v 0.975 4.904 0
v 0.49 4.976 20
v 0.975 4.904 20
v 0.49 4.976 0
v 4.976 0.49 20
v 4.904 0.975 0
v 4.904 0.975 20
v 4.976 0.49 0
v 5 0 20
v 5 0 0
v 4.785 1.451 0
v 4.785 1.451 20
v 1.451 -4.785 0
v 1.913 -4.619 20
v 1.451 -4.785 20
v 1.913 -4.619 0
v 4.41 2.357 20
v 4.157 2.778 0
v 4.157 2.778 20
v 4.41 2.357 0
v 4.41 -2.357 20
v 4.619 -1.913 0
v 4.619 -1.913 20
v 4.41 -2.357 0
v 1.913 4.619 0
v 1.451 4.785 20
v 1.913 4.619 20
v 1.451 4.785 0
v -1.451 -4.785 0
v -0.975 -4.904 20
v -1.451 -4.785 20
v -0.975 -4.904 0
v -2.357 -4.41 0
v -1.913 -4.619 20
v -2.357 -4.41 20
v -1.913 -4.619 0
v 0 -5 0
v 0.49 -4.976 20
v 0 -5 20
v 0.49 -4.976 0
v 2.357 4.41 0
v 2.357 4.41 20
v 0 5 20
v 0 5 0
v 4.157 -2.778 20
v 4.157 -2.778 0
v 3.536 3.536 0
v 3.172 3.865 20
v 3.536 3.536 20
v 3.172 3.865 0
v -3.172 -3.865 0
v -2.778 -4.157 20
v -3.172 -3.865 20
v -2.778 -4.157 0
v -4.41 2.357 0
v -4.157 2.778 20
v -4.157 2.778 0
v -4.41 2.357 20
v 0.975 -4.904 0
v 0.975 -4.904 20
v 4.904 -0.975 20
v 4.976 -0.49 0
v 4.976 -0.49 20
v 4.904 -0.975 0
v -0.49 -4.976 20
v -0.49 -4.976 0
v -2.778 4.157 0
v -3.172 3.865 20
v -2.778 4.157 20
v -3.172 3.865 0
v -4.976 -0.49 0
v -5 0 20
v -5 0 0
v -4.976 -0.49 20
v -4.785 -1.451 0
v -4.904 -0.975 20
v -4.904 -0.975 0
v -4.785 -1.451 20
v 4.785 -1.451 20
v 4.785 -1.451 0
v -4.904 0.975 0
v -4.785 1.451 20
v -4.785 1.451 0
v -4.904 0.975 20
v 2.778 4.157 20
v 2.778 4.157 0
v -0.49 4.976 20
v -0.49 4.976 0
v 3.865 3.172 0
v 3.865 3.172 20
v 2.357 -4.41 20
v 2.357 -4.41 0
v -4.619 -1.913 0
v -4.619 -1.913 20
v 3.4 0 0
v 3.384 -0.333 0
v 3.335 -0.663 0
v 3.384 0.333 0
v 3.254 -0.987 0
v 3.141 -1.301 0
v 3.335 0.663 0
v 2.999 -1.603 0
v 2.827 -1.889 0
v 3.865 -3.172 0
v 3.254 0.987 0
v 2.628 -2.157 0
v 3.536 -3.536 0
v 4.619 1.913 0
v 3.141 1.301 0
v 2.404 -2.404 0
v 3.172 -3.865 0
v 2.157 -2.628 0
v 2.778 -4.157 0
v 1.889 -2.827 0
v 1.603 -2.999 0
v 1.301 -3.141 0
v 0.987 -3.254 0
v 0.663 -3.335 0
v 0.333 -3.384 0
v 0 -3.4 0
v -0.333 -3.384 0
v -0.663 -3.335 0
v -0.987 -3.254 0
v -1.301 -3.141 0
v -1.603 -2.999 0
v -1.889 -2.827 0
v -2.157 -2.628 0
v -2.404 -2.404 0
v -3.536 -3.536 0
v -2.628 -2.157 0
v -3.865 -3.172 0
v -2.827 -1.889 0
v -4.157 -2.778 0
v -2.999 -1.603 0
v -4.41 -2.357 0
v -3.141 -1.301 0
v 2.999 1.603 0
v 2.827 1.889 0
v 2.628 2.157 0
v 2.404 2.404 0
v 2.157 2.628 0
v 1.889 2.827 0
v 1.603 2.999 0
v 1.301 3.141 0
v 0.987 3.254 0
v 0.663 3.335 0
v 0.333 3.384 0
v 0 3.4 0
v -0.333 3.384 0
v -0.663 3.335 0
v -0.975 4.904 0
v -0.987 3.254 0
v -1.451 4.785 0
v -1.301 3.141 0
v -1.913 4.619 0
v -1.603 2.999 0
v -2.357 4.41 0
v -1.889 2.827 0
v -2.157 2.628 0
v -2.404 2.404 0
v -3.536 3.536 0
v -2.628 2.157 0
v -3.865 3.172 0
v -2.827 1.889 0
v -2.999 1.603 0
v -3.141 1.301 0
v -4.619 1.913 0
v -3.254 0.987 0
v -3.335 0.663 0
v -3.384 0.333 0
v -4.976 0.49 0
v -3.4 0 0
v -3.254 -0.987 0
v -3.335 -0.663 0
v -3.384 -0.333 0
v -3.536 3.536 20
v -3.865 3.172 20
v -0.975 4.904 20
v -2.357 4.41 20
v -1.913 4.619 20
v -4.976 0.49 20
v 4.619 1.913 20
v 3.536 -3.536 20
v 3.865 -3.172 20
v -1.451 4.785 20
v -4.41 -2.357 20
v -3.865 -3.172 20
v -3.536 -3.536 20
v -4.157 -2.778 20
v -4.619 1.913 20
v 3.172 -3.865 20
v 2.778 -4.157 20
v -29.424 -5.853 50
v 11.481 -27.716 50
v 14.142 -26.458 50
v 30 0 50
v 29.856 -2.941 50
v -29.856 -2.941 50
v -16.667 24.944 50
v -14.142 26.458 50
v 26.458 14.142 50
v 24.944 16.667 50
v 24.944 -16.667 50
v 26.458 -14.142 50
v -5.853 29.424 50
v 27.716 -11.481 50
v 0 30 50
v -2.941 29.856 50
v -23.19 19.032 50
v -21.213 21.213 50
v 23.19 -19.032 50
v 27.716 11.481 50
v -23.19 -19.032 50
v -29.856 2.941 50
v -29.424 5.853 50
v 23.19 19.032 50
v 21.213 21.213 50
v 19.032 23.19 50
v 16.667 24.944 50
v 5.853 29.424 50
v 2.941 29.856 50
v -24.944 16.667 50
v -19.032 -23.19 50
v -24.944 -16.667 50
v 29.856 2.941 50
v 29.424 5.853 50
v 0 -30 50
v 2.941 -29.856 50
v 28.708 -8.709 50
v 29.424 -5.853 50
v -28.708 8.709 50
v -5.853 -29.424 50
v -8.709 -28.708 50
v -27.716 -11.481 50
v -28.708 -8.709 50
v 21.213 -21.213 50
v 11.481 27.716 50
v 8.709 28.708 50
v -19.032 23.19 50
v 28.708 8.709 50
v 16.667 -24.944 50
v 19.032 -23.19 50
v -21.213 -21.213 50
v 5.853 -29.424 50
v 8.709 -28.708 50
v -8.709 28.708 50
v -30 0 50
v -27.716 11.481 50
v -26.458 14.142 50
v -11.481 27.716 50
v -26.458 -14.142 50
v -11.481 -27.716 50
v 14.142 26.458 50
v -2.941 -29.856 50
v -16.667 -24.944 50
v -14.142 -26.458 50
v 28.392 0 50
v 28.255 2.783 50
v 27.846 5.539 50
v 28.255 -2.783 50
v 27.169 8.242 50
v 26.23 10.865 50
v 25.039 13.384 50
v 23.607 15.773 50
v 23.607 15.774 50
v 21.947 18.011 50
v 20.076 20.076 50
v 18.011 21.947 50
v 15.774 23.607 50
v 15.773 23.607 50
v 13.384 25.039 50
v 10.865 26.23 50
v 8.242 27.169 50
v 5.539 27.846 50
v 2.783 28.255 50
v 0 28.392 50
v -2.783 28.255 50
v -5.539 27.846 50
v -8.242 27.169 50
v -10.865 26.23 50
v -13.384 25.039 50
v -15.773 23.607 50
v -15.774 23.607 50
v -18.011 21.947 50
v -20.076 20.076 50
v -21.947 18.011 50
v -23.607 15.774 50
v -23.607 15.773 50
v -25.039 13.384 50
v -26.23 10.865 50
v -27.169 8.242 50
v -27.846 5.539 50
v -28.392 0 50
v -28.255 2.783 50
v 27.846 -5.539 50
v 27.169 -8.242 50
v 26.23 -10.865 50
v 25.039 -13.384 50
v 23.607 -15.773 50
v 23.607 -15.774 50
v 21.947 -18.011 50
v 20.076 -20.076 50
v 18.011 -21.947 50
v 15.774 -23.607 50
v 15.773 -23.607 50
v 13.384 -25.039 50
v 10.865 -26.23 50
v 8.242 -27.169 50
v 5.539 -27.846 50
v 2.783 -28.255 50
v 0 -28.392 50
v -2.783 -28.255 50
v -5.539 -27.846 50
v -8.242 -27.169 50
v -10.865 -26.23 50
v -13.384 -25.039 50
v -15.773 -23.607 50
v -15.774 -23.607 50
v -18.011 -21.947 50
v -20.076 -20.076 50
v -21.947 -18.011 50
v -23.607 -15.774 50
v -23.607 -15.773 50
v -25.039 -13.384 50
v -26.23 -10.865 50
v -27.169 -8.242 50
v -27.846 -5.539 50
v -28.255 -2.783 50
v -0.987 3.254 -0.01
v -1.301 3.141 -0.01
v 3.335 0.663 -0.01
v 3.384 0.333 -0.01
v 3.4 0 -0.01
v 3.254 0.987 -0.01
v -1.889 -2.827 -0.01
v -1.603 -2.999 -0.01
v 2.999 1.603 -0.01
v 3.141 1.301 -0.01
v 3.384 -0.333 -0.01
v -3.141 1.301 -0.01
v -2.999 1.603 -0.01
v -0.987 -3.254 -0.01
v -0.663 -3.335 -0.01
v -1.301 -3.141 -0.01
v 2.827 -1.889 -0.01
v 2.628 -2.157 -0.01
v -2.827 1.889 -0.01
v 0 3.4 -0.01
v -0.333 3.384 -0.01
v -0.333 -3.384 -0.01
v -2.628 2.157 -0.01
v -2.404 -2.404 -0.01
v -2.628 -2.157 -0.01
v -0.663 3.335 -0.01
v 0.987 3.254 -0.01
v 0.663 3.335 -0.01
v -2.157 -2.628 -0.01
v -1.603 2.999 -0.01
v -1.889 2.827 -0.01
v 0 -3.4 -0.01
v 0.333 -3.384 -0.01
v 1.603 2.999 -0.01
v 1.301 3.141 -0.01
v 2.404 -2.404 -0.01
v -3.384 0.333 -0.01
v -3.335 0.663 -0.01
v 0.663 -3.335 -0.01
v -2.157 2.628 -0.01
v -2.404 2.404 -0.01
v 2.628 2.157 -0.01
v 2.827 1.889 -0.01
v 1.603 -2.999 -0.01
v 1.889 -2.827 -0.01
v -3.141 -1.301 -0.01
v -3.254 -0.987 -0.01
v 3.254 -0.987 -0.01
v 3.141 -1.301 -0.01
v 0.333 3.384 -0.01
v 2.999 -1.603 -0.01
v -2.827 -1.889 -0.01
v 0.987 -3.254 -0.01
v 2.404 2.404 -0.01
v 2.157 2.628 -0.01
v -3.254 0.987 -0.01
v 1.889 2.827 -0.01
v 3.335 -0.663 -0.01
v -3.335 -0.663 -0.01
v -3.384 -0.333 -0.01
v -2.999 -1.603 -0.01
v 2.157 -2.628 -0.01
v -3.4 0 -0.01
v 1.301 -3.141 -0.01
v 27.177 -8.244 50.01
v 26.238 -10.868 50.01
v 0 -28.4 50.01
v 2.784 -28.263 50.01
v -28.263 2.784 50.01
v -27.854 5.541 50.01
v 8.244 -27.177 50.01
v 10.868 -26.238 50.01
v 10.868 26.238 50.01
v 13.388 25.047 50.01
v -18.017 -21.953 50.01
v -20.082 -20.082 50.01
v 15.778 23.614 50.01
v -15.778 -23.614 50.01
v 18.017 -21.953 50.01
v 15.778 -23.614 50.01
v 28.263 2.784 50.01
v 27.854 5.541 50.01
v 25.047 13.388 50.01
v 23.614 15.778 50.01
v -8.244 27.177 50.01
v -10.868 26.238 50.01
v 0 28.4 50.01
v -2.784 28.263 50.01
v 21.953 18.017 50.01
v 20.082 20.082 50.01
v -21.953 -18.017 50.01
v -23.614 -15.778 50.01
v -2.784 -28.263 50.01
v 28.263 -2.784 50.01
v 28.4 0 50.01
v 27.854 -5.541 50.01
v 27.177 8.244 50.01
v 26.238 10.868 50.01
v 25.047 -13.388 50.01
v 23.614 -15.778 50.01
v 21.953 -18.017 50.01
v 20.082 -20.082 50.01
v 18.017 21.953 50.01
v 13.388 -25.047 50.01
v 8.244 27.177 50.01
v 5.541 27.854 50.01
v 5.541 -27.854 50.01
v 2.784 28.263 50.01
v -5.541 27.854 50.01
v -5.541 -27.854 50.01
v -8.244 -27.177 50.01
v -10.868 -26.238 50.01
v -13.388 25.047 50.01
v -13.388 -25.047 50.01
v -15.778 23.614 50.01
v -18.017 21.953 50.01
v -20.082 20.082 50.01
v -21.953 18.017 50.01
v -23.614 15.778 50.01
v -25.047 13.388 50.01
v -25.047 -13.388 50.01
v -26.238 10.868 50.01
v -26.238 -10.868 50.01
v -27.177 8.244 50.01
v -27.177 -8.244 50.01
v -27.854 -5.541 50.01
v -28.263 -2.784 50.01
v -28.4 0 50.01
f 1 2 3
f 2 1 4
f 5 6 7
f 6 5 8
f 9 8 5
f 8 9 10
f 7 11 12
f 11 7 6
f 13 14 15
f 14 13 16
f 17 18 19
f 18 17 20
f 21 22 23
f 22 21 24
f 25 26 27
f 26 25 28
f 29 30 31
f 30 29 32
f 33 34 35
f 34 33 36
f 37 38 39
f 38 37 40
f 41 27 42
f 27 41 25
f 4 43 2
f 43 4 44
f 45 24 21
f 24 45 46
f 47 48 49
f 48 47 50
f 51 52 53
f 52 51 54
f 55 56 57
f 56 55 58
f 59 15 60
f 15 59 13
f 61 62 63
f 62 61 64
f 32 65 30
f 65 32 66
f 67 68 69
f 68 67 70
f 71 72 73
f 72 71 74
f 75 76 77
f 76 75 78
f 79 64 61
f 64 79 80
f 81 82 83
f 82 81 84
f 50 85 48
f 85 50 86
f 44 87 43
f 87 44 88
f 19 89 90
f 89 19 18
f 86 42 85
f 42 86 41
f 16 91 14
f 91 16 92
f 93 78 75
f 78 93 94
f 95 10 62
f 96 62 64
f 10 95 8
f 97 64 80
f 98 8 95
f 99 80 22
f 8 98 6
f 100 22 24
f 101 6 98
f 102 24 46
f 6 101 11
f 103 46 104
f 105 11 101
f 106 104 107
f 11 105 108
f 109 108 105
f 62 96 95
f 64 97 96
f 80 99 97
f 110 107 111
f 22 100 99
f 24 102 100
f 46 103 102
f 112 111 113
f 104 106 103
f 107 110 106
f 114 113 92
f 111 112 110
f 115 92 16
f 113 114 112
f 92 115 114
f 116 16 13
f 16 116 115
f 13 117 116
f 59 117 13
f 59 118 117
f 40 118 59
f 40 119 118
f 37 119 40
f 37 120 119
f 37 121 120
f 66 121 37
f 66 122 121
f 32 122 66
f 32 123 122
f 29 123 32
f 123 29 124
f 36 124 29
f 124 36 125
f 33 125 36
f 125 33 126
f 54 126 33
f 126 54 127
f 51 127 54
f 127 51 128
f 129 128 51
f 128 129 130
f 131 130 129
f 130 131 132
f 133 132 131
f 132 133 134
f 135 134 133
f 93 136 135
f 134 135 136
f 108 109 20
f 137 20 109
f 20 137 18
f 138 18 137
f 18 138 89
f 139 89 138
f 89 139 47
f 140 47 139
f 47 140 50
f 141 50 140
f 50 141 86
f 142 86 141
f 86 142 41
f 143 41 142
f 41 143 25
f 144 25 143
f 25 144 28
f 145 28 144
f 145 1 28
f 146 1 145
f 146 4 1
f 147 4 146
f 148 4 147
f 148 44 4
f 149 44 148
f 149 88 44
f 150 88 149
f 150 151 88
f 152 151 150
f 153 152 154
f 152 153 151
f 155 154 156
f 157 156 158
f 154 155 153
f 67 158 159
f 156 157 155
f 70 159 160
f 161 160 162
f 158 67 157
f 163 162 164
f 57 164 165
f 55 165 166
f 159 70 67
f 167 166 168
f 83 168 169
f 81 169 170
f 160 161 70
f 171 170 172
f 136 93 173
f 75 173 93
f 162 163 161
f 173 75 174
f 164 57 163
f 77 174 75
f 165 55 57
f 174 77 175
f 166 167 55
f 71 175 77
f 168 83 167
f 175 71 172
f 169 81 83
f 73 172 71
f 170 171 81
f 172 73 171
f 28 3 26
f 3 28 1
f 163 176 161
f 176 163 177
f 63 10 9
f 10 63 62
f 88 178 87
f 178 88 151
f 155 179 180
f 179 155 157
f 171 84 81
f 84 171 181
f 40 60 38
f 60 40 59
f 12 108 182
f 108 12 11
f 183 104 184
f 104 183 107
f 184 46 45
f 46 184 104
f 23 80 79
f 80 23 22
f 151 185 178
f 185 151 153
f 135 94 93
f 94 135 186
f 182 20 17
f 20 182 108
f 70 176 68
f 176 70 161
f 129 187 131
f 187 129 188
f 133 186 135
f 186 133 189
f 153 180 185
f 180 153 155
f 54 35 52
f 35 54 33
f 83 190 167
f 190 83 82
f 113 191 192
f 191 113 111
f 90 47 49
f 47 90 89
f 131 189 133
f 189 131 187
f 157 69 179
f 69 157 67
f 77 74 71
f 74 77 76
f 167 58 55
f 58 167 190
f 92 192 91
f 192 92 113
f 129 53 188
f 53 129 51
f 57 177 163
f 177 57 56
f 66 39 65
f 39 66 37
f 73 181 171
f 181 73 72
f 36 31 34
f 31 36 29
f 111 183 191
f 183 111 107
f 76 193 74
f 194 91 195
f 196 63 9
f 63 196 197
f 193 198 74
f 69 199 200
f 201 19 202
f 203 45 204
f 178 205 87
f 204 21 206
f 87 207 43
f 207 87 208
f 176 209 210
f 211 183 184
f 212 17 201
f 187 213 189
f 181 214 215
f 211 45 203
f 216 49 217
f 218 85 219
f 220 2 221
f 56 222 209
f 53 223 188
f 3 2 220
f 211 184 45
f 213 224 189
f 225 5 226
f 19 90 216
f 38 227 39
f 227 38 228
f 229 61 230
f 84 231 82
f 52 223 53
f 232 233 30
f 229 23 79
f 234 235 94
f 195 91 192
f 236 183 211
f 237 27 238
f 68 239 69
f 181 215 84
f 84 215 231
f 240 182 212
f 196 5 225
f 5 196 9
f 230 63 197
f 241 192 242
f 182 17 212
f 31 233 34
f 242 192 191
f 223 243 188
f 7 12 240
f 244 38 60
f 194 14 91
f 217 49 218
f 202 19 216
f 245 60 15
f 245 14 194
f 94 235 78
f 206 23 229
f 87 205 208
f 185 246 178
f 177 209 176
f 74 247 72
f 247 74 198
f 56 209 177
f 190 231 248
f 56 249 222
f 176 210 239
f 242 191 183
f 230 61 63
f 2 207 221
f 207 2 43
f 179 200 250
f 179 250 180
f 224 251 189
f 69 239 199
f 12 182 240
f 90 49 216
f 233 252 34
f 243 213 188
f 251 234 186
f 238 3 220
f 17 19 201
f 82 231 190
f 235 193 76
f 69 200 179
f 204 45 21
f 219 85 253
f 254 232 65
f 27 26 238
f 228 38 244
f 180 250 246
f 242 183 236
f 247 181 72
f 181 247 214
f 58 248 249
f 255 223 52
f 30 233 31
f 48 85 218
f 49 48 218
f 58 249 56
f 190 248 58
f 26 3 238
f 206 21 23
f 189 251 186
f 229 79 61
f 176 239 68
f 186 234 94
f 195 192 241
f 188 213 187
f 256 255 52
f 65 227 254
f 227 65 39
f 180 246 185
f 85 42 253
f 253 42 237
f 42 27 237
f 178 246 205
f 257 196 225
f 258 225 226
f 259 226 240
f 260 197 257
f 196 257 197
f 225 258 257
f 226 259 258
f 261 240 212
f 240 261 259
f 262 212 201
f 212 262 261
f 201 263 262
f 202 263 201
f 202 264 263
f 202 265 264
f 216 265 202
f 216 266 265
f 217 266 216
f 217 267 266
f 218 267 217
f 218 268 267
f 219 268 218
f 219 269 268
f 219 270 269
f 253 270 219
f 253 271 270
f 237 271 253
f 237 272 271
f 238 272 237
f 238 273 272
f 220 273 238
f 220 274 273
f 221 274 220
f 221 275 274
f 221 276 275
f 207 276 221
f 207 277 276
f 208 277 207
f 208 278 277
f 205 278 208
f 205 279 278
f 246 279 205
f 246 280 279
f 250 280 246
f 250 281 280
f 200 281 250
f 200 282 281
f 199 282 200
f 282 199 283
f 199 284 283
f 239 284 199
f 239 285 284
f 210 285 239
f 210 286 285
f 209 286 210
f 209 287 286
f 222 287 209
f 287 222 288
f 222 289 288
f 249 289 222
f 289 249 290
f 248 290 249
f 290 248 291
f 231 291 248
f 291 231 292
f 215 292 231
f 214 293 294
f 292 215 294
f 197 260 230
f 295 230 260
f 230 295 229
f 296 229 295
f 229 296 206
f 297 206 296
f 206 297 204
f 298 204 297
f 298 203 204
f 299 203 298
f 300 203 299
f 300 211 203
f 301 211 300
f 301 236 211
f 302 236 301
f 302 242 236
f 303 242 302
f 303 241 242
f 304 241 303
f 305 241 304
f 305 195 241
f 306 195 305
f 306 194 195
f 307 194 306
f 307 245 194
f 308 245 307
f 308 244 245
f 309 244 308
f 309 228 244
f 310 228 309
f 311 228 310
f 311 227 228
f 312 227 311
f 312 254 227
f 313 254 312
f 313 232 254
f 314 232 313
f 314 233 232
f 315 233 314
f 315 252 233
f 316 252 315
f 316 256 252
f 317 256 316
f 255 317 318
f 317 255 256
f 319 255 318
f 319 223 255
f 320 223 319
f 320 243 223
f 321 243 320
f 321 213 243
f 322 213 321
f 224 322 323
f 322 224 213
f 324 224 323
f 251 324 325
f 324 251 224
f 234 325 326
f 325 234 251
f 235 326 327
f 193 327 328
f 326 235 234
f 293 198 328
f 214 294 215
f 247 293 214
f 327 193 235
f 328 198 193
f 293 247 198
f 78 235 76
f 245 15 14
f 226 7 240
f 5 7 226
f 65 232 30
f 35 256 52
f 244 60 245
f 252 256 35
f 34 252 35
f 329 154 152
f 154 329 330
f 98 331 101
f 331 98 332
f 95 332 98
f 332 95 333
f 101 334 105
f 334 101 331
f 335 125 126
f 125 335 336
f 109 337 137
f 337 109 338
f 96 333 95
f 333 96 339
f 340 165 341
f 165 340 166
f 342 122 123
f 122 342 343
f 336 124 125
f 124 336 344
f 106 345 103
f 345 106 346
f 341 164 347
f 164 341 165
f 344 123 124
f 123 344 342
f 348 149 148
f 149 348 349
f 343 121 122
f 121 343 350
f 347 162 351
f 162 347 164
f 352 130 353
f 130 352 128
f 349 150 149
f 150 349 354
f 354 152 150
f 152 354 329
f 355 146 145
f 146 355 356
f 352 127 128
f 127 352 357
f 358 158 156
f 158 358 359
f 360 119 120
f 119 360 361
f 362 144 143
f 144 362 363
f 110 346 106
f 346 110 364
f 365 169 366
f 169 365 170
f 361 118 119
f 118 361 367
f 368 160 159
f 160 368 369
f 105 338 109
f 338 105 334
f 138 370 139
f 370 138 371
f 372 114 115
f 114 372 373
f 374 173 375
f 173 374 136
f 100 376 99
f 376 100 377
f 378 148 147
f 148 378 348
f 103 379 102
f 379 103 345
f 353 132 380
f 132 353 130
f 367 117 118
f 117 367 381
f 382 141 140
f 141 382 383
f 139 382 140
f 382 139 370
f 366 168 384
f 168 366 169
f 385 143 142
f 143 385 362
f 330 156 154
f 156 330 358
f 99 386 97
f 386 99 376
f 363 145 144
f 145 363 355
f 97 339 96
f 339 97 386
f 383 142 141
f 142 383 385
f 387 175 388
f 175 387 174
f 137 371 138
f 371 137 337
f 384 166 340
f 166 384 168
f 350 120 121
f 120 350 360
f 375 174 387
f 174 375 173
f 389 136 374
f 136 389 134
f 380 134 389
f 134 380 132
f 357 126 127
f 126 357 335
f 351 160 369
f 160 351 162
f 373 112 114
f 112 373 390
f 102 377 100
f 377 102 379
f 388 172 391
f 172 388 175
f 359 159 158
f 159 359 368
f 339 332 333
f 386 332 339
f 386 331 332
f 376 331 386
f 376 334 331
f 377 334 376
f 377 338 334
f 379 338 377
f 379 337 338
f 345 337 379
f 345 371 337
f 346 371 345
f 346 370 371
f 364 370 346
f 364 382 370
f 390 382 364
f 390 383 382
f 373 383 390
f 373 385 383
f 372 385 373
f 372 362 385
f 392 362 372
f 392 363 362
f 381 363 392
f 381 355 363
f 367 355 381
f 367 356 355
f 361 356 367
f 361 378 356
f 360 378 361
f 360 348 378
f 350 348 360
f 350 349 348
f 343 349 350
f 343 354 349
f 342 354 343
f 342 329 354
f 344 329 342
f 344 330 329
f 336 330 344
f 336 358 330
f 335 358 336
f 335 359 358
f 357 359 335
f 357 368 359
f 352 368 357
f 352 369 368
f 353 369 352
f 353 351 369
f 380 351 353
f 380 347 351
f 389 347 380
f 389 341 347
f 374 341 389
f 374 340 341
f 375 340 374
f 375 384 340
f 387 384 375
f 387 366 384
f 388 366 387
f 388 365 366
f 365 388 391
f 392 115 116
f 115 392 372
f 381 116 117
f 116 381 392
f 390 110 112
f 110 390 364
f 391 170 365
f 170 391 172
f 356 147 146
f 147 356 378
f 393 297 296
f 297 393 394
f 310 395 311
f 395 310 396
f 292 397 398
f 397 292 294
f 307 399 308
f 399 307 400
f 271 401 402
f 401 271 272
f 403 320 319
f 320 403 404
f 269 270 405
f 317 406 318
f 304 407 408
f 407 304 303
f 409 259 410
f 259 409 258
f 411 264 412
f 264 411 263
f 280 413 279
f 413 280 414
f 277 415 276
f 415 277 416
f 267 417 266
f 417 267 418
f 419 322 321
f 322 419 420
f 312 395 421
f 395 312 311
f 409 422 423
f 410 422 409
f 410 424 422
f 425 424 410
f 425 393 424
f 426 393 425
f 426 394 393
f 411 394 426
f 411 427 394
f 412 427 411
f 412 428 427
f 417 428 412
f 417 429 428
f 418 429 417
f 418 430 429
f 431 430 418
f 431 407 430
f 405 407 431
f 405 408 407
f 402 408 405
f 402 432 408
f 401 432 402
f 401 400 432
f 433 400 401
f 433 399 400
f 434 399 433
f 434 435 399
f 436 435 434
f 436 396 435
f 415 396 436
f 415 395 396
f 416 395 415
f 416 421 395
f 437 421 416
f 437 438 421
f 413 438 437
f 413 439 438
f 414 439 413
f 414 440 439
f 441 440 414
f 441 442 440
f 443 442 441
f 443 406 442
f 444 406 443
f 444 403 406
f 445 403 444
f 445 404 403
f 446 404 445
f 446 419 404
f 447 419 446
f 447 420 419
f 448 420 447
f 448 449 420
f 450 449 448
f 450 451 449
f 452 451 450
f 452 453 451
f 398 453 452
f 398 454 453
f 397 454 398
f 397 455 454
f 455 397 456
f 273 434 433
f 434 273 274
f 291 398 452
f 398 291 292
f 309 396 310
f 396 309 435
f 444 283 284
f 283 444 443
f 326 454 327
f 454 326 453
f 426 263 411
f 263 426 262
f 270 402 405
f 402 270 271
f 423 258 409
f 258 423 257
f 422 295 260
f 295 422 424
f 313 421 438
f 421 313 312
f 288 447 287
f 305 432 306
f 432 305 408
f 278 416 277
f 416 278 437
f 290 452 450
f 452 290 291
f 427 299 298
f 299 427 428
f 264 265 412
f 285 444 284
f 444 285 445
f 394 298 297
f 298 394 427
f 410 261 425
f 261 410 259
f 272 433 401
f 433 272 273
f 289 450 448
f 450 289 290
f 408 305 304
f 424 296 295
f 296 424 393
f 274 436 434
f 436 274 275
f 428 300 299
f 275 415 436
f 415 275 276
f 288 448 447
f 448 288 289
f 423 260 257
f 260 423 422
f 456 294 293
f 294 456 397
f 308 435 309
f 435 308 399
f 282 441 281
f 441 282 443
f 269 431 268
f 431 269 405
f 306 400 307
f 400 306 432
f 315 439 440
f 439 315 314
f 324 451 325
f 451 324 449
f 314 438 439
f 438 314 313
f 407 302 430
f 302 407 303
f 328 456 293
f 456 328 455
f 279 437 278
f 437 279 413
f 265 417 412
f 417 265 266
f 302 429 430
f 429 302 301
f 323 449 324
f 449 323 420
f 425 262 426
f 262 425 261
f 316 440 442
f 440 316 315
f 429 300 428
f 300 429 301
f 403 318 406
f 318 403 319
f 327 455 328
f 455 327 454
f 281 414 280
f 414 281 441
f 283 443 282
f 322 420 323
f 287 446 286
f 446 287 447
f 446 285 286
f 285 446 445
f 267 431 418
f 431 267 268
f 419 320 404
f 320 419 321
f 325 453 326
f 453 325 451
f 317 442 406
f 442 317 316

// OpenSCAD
// Lab Funnel Design
// Wall thickness: 1.6 mm
// Spout: 10 mm outer diameter, 20 mm tall (z = 0 to z = 20)
// Cone: 10 mm outer diameter at z = 20, 60 mm outer diameter at z = 50

$fn = 64;

wall_thickness = 1.6;
spout_outer_diameter = 10;
spout_height = 20;
cone_top_diameter = 10;
cone_bottom_diameter = 60;
cone_height = 30; // from z = 20 to z = 50

// Calculate inner diameters
spout_inner_diameter = spout_outer_diameter - 2 * wall_thickness;
cone_top_inner_diameter = cone_top_diameter - 2 * wall_thickness;
cone_bottom_inner_diameter = cone_bottom_diameter - 2 * wall_thickness;

// Spout (cylinder)
spout_outer_radius = spout_outer_diameter / 2;
spout_inner_radius = spout_inner_diameter / 2;

// Cone (frustum)
cone_top_radius = cone_top_diameter / 2;
cone_bottom_radius = cone_bottom_diameter / 2;
cone_top_inner_radius = cone_top_inner_diameter / 2;
cone_bottom_inner_radius = cone_bottom_inner_diameter / 2;

// Build the funnel
module funnel() {
    // Outer spout
    translate([0, 0, 0])
        cylinder(h = spout_height, r = spout_outer_radius, center = false);
    
    // Outer cone (frustum)
    translate([0, 0, spout_height])
        cylinder(h = cone_height, r1 = cone_top_radius, r2 = cone_bottom_radius, center = false);
    
    // Inner spout (hole)
    translate([0, 0, -0.01])
        cylinder(h = spout_height + 0.02, r = spout_inner_radius, center = false);
    
    // Inner cone (hole)
    translate([0, 0, spout_height - 0.01])
        cylinder(h = cone_height + 0.02, r1 = cone_top_inner_radius, r2 = cone_bottom_inner_radius, center = false);
}

funnel();
